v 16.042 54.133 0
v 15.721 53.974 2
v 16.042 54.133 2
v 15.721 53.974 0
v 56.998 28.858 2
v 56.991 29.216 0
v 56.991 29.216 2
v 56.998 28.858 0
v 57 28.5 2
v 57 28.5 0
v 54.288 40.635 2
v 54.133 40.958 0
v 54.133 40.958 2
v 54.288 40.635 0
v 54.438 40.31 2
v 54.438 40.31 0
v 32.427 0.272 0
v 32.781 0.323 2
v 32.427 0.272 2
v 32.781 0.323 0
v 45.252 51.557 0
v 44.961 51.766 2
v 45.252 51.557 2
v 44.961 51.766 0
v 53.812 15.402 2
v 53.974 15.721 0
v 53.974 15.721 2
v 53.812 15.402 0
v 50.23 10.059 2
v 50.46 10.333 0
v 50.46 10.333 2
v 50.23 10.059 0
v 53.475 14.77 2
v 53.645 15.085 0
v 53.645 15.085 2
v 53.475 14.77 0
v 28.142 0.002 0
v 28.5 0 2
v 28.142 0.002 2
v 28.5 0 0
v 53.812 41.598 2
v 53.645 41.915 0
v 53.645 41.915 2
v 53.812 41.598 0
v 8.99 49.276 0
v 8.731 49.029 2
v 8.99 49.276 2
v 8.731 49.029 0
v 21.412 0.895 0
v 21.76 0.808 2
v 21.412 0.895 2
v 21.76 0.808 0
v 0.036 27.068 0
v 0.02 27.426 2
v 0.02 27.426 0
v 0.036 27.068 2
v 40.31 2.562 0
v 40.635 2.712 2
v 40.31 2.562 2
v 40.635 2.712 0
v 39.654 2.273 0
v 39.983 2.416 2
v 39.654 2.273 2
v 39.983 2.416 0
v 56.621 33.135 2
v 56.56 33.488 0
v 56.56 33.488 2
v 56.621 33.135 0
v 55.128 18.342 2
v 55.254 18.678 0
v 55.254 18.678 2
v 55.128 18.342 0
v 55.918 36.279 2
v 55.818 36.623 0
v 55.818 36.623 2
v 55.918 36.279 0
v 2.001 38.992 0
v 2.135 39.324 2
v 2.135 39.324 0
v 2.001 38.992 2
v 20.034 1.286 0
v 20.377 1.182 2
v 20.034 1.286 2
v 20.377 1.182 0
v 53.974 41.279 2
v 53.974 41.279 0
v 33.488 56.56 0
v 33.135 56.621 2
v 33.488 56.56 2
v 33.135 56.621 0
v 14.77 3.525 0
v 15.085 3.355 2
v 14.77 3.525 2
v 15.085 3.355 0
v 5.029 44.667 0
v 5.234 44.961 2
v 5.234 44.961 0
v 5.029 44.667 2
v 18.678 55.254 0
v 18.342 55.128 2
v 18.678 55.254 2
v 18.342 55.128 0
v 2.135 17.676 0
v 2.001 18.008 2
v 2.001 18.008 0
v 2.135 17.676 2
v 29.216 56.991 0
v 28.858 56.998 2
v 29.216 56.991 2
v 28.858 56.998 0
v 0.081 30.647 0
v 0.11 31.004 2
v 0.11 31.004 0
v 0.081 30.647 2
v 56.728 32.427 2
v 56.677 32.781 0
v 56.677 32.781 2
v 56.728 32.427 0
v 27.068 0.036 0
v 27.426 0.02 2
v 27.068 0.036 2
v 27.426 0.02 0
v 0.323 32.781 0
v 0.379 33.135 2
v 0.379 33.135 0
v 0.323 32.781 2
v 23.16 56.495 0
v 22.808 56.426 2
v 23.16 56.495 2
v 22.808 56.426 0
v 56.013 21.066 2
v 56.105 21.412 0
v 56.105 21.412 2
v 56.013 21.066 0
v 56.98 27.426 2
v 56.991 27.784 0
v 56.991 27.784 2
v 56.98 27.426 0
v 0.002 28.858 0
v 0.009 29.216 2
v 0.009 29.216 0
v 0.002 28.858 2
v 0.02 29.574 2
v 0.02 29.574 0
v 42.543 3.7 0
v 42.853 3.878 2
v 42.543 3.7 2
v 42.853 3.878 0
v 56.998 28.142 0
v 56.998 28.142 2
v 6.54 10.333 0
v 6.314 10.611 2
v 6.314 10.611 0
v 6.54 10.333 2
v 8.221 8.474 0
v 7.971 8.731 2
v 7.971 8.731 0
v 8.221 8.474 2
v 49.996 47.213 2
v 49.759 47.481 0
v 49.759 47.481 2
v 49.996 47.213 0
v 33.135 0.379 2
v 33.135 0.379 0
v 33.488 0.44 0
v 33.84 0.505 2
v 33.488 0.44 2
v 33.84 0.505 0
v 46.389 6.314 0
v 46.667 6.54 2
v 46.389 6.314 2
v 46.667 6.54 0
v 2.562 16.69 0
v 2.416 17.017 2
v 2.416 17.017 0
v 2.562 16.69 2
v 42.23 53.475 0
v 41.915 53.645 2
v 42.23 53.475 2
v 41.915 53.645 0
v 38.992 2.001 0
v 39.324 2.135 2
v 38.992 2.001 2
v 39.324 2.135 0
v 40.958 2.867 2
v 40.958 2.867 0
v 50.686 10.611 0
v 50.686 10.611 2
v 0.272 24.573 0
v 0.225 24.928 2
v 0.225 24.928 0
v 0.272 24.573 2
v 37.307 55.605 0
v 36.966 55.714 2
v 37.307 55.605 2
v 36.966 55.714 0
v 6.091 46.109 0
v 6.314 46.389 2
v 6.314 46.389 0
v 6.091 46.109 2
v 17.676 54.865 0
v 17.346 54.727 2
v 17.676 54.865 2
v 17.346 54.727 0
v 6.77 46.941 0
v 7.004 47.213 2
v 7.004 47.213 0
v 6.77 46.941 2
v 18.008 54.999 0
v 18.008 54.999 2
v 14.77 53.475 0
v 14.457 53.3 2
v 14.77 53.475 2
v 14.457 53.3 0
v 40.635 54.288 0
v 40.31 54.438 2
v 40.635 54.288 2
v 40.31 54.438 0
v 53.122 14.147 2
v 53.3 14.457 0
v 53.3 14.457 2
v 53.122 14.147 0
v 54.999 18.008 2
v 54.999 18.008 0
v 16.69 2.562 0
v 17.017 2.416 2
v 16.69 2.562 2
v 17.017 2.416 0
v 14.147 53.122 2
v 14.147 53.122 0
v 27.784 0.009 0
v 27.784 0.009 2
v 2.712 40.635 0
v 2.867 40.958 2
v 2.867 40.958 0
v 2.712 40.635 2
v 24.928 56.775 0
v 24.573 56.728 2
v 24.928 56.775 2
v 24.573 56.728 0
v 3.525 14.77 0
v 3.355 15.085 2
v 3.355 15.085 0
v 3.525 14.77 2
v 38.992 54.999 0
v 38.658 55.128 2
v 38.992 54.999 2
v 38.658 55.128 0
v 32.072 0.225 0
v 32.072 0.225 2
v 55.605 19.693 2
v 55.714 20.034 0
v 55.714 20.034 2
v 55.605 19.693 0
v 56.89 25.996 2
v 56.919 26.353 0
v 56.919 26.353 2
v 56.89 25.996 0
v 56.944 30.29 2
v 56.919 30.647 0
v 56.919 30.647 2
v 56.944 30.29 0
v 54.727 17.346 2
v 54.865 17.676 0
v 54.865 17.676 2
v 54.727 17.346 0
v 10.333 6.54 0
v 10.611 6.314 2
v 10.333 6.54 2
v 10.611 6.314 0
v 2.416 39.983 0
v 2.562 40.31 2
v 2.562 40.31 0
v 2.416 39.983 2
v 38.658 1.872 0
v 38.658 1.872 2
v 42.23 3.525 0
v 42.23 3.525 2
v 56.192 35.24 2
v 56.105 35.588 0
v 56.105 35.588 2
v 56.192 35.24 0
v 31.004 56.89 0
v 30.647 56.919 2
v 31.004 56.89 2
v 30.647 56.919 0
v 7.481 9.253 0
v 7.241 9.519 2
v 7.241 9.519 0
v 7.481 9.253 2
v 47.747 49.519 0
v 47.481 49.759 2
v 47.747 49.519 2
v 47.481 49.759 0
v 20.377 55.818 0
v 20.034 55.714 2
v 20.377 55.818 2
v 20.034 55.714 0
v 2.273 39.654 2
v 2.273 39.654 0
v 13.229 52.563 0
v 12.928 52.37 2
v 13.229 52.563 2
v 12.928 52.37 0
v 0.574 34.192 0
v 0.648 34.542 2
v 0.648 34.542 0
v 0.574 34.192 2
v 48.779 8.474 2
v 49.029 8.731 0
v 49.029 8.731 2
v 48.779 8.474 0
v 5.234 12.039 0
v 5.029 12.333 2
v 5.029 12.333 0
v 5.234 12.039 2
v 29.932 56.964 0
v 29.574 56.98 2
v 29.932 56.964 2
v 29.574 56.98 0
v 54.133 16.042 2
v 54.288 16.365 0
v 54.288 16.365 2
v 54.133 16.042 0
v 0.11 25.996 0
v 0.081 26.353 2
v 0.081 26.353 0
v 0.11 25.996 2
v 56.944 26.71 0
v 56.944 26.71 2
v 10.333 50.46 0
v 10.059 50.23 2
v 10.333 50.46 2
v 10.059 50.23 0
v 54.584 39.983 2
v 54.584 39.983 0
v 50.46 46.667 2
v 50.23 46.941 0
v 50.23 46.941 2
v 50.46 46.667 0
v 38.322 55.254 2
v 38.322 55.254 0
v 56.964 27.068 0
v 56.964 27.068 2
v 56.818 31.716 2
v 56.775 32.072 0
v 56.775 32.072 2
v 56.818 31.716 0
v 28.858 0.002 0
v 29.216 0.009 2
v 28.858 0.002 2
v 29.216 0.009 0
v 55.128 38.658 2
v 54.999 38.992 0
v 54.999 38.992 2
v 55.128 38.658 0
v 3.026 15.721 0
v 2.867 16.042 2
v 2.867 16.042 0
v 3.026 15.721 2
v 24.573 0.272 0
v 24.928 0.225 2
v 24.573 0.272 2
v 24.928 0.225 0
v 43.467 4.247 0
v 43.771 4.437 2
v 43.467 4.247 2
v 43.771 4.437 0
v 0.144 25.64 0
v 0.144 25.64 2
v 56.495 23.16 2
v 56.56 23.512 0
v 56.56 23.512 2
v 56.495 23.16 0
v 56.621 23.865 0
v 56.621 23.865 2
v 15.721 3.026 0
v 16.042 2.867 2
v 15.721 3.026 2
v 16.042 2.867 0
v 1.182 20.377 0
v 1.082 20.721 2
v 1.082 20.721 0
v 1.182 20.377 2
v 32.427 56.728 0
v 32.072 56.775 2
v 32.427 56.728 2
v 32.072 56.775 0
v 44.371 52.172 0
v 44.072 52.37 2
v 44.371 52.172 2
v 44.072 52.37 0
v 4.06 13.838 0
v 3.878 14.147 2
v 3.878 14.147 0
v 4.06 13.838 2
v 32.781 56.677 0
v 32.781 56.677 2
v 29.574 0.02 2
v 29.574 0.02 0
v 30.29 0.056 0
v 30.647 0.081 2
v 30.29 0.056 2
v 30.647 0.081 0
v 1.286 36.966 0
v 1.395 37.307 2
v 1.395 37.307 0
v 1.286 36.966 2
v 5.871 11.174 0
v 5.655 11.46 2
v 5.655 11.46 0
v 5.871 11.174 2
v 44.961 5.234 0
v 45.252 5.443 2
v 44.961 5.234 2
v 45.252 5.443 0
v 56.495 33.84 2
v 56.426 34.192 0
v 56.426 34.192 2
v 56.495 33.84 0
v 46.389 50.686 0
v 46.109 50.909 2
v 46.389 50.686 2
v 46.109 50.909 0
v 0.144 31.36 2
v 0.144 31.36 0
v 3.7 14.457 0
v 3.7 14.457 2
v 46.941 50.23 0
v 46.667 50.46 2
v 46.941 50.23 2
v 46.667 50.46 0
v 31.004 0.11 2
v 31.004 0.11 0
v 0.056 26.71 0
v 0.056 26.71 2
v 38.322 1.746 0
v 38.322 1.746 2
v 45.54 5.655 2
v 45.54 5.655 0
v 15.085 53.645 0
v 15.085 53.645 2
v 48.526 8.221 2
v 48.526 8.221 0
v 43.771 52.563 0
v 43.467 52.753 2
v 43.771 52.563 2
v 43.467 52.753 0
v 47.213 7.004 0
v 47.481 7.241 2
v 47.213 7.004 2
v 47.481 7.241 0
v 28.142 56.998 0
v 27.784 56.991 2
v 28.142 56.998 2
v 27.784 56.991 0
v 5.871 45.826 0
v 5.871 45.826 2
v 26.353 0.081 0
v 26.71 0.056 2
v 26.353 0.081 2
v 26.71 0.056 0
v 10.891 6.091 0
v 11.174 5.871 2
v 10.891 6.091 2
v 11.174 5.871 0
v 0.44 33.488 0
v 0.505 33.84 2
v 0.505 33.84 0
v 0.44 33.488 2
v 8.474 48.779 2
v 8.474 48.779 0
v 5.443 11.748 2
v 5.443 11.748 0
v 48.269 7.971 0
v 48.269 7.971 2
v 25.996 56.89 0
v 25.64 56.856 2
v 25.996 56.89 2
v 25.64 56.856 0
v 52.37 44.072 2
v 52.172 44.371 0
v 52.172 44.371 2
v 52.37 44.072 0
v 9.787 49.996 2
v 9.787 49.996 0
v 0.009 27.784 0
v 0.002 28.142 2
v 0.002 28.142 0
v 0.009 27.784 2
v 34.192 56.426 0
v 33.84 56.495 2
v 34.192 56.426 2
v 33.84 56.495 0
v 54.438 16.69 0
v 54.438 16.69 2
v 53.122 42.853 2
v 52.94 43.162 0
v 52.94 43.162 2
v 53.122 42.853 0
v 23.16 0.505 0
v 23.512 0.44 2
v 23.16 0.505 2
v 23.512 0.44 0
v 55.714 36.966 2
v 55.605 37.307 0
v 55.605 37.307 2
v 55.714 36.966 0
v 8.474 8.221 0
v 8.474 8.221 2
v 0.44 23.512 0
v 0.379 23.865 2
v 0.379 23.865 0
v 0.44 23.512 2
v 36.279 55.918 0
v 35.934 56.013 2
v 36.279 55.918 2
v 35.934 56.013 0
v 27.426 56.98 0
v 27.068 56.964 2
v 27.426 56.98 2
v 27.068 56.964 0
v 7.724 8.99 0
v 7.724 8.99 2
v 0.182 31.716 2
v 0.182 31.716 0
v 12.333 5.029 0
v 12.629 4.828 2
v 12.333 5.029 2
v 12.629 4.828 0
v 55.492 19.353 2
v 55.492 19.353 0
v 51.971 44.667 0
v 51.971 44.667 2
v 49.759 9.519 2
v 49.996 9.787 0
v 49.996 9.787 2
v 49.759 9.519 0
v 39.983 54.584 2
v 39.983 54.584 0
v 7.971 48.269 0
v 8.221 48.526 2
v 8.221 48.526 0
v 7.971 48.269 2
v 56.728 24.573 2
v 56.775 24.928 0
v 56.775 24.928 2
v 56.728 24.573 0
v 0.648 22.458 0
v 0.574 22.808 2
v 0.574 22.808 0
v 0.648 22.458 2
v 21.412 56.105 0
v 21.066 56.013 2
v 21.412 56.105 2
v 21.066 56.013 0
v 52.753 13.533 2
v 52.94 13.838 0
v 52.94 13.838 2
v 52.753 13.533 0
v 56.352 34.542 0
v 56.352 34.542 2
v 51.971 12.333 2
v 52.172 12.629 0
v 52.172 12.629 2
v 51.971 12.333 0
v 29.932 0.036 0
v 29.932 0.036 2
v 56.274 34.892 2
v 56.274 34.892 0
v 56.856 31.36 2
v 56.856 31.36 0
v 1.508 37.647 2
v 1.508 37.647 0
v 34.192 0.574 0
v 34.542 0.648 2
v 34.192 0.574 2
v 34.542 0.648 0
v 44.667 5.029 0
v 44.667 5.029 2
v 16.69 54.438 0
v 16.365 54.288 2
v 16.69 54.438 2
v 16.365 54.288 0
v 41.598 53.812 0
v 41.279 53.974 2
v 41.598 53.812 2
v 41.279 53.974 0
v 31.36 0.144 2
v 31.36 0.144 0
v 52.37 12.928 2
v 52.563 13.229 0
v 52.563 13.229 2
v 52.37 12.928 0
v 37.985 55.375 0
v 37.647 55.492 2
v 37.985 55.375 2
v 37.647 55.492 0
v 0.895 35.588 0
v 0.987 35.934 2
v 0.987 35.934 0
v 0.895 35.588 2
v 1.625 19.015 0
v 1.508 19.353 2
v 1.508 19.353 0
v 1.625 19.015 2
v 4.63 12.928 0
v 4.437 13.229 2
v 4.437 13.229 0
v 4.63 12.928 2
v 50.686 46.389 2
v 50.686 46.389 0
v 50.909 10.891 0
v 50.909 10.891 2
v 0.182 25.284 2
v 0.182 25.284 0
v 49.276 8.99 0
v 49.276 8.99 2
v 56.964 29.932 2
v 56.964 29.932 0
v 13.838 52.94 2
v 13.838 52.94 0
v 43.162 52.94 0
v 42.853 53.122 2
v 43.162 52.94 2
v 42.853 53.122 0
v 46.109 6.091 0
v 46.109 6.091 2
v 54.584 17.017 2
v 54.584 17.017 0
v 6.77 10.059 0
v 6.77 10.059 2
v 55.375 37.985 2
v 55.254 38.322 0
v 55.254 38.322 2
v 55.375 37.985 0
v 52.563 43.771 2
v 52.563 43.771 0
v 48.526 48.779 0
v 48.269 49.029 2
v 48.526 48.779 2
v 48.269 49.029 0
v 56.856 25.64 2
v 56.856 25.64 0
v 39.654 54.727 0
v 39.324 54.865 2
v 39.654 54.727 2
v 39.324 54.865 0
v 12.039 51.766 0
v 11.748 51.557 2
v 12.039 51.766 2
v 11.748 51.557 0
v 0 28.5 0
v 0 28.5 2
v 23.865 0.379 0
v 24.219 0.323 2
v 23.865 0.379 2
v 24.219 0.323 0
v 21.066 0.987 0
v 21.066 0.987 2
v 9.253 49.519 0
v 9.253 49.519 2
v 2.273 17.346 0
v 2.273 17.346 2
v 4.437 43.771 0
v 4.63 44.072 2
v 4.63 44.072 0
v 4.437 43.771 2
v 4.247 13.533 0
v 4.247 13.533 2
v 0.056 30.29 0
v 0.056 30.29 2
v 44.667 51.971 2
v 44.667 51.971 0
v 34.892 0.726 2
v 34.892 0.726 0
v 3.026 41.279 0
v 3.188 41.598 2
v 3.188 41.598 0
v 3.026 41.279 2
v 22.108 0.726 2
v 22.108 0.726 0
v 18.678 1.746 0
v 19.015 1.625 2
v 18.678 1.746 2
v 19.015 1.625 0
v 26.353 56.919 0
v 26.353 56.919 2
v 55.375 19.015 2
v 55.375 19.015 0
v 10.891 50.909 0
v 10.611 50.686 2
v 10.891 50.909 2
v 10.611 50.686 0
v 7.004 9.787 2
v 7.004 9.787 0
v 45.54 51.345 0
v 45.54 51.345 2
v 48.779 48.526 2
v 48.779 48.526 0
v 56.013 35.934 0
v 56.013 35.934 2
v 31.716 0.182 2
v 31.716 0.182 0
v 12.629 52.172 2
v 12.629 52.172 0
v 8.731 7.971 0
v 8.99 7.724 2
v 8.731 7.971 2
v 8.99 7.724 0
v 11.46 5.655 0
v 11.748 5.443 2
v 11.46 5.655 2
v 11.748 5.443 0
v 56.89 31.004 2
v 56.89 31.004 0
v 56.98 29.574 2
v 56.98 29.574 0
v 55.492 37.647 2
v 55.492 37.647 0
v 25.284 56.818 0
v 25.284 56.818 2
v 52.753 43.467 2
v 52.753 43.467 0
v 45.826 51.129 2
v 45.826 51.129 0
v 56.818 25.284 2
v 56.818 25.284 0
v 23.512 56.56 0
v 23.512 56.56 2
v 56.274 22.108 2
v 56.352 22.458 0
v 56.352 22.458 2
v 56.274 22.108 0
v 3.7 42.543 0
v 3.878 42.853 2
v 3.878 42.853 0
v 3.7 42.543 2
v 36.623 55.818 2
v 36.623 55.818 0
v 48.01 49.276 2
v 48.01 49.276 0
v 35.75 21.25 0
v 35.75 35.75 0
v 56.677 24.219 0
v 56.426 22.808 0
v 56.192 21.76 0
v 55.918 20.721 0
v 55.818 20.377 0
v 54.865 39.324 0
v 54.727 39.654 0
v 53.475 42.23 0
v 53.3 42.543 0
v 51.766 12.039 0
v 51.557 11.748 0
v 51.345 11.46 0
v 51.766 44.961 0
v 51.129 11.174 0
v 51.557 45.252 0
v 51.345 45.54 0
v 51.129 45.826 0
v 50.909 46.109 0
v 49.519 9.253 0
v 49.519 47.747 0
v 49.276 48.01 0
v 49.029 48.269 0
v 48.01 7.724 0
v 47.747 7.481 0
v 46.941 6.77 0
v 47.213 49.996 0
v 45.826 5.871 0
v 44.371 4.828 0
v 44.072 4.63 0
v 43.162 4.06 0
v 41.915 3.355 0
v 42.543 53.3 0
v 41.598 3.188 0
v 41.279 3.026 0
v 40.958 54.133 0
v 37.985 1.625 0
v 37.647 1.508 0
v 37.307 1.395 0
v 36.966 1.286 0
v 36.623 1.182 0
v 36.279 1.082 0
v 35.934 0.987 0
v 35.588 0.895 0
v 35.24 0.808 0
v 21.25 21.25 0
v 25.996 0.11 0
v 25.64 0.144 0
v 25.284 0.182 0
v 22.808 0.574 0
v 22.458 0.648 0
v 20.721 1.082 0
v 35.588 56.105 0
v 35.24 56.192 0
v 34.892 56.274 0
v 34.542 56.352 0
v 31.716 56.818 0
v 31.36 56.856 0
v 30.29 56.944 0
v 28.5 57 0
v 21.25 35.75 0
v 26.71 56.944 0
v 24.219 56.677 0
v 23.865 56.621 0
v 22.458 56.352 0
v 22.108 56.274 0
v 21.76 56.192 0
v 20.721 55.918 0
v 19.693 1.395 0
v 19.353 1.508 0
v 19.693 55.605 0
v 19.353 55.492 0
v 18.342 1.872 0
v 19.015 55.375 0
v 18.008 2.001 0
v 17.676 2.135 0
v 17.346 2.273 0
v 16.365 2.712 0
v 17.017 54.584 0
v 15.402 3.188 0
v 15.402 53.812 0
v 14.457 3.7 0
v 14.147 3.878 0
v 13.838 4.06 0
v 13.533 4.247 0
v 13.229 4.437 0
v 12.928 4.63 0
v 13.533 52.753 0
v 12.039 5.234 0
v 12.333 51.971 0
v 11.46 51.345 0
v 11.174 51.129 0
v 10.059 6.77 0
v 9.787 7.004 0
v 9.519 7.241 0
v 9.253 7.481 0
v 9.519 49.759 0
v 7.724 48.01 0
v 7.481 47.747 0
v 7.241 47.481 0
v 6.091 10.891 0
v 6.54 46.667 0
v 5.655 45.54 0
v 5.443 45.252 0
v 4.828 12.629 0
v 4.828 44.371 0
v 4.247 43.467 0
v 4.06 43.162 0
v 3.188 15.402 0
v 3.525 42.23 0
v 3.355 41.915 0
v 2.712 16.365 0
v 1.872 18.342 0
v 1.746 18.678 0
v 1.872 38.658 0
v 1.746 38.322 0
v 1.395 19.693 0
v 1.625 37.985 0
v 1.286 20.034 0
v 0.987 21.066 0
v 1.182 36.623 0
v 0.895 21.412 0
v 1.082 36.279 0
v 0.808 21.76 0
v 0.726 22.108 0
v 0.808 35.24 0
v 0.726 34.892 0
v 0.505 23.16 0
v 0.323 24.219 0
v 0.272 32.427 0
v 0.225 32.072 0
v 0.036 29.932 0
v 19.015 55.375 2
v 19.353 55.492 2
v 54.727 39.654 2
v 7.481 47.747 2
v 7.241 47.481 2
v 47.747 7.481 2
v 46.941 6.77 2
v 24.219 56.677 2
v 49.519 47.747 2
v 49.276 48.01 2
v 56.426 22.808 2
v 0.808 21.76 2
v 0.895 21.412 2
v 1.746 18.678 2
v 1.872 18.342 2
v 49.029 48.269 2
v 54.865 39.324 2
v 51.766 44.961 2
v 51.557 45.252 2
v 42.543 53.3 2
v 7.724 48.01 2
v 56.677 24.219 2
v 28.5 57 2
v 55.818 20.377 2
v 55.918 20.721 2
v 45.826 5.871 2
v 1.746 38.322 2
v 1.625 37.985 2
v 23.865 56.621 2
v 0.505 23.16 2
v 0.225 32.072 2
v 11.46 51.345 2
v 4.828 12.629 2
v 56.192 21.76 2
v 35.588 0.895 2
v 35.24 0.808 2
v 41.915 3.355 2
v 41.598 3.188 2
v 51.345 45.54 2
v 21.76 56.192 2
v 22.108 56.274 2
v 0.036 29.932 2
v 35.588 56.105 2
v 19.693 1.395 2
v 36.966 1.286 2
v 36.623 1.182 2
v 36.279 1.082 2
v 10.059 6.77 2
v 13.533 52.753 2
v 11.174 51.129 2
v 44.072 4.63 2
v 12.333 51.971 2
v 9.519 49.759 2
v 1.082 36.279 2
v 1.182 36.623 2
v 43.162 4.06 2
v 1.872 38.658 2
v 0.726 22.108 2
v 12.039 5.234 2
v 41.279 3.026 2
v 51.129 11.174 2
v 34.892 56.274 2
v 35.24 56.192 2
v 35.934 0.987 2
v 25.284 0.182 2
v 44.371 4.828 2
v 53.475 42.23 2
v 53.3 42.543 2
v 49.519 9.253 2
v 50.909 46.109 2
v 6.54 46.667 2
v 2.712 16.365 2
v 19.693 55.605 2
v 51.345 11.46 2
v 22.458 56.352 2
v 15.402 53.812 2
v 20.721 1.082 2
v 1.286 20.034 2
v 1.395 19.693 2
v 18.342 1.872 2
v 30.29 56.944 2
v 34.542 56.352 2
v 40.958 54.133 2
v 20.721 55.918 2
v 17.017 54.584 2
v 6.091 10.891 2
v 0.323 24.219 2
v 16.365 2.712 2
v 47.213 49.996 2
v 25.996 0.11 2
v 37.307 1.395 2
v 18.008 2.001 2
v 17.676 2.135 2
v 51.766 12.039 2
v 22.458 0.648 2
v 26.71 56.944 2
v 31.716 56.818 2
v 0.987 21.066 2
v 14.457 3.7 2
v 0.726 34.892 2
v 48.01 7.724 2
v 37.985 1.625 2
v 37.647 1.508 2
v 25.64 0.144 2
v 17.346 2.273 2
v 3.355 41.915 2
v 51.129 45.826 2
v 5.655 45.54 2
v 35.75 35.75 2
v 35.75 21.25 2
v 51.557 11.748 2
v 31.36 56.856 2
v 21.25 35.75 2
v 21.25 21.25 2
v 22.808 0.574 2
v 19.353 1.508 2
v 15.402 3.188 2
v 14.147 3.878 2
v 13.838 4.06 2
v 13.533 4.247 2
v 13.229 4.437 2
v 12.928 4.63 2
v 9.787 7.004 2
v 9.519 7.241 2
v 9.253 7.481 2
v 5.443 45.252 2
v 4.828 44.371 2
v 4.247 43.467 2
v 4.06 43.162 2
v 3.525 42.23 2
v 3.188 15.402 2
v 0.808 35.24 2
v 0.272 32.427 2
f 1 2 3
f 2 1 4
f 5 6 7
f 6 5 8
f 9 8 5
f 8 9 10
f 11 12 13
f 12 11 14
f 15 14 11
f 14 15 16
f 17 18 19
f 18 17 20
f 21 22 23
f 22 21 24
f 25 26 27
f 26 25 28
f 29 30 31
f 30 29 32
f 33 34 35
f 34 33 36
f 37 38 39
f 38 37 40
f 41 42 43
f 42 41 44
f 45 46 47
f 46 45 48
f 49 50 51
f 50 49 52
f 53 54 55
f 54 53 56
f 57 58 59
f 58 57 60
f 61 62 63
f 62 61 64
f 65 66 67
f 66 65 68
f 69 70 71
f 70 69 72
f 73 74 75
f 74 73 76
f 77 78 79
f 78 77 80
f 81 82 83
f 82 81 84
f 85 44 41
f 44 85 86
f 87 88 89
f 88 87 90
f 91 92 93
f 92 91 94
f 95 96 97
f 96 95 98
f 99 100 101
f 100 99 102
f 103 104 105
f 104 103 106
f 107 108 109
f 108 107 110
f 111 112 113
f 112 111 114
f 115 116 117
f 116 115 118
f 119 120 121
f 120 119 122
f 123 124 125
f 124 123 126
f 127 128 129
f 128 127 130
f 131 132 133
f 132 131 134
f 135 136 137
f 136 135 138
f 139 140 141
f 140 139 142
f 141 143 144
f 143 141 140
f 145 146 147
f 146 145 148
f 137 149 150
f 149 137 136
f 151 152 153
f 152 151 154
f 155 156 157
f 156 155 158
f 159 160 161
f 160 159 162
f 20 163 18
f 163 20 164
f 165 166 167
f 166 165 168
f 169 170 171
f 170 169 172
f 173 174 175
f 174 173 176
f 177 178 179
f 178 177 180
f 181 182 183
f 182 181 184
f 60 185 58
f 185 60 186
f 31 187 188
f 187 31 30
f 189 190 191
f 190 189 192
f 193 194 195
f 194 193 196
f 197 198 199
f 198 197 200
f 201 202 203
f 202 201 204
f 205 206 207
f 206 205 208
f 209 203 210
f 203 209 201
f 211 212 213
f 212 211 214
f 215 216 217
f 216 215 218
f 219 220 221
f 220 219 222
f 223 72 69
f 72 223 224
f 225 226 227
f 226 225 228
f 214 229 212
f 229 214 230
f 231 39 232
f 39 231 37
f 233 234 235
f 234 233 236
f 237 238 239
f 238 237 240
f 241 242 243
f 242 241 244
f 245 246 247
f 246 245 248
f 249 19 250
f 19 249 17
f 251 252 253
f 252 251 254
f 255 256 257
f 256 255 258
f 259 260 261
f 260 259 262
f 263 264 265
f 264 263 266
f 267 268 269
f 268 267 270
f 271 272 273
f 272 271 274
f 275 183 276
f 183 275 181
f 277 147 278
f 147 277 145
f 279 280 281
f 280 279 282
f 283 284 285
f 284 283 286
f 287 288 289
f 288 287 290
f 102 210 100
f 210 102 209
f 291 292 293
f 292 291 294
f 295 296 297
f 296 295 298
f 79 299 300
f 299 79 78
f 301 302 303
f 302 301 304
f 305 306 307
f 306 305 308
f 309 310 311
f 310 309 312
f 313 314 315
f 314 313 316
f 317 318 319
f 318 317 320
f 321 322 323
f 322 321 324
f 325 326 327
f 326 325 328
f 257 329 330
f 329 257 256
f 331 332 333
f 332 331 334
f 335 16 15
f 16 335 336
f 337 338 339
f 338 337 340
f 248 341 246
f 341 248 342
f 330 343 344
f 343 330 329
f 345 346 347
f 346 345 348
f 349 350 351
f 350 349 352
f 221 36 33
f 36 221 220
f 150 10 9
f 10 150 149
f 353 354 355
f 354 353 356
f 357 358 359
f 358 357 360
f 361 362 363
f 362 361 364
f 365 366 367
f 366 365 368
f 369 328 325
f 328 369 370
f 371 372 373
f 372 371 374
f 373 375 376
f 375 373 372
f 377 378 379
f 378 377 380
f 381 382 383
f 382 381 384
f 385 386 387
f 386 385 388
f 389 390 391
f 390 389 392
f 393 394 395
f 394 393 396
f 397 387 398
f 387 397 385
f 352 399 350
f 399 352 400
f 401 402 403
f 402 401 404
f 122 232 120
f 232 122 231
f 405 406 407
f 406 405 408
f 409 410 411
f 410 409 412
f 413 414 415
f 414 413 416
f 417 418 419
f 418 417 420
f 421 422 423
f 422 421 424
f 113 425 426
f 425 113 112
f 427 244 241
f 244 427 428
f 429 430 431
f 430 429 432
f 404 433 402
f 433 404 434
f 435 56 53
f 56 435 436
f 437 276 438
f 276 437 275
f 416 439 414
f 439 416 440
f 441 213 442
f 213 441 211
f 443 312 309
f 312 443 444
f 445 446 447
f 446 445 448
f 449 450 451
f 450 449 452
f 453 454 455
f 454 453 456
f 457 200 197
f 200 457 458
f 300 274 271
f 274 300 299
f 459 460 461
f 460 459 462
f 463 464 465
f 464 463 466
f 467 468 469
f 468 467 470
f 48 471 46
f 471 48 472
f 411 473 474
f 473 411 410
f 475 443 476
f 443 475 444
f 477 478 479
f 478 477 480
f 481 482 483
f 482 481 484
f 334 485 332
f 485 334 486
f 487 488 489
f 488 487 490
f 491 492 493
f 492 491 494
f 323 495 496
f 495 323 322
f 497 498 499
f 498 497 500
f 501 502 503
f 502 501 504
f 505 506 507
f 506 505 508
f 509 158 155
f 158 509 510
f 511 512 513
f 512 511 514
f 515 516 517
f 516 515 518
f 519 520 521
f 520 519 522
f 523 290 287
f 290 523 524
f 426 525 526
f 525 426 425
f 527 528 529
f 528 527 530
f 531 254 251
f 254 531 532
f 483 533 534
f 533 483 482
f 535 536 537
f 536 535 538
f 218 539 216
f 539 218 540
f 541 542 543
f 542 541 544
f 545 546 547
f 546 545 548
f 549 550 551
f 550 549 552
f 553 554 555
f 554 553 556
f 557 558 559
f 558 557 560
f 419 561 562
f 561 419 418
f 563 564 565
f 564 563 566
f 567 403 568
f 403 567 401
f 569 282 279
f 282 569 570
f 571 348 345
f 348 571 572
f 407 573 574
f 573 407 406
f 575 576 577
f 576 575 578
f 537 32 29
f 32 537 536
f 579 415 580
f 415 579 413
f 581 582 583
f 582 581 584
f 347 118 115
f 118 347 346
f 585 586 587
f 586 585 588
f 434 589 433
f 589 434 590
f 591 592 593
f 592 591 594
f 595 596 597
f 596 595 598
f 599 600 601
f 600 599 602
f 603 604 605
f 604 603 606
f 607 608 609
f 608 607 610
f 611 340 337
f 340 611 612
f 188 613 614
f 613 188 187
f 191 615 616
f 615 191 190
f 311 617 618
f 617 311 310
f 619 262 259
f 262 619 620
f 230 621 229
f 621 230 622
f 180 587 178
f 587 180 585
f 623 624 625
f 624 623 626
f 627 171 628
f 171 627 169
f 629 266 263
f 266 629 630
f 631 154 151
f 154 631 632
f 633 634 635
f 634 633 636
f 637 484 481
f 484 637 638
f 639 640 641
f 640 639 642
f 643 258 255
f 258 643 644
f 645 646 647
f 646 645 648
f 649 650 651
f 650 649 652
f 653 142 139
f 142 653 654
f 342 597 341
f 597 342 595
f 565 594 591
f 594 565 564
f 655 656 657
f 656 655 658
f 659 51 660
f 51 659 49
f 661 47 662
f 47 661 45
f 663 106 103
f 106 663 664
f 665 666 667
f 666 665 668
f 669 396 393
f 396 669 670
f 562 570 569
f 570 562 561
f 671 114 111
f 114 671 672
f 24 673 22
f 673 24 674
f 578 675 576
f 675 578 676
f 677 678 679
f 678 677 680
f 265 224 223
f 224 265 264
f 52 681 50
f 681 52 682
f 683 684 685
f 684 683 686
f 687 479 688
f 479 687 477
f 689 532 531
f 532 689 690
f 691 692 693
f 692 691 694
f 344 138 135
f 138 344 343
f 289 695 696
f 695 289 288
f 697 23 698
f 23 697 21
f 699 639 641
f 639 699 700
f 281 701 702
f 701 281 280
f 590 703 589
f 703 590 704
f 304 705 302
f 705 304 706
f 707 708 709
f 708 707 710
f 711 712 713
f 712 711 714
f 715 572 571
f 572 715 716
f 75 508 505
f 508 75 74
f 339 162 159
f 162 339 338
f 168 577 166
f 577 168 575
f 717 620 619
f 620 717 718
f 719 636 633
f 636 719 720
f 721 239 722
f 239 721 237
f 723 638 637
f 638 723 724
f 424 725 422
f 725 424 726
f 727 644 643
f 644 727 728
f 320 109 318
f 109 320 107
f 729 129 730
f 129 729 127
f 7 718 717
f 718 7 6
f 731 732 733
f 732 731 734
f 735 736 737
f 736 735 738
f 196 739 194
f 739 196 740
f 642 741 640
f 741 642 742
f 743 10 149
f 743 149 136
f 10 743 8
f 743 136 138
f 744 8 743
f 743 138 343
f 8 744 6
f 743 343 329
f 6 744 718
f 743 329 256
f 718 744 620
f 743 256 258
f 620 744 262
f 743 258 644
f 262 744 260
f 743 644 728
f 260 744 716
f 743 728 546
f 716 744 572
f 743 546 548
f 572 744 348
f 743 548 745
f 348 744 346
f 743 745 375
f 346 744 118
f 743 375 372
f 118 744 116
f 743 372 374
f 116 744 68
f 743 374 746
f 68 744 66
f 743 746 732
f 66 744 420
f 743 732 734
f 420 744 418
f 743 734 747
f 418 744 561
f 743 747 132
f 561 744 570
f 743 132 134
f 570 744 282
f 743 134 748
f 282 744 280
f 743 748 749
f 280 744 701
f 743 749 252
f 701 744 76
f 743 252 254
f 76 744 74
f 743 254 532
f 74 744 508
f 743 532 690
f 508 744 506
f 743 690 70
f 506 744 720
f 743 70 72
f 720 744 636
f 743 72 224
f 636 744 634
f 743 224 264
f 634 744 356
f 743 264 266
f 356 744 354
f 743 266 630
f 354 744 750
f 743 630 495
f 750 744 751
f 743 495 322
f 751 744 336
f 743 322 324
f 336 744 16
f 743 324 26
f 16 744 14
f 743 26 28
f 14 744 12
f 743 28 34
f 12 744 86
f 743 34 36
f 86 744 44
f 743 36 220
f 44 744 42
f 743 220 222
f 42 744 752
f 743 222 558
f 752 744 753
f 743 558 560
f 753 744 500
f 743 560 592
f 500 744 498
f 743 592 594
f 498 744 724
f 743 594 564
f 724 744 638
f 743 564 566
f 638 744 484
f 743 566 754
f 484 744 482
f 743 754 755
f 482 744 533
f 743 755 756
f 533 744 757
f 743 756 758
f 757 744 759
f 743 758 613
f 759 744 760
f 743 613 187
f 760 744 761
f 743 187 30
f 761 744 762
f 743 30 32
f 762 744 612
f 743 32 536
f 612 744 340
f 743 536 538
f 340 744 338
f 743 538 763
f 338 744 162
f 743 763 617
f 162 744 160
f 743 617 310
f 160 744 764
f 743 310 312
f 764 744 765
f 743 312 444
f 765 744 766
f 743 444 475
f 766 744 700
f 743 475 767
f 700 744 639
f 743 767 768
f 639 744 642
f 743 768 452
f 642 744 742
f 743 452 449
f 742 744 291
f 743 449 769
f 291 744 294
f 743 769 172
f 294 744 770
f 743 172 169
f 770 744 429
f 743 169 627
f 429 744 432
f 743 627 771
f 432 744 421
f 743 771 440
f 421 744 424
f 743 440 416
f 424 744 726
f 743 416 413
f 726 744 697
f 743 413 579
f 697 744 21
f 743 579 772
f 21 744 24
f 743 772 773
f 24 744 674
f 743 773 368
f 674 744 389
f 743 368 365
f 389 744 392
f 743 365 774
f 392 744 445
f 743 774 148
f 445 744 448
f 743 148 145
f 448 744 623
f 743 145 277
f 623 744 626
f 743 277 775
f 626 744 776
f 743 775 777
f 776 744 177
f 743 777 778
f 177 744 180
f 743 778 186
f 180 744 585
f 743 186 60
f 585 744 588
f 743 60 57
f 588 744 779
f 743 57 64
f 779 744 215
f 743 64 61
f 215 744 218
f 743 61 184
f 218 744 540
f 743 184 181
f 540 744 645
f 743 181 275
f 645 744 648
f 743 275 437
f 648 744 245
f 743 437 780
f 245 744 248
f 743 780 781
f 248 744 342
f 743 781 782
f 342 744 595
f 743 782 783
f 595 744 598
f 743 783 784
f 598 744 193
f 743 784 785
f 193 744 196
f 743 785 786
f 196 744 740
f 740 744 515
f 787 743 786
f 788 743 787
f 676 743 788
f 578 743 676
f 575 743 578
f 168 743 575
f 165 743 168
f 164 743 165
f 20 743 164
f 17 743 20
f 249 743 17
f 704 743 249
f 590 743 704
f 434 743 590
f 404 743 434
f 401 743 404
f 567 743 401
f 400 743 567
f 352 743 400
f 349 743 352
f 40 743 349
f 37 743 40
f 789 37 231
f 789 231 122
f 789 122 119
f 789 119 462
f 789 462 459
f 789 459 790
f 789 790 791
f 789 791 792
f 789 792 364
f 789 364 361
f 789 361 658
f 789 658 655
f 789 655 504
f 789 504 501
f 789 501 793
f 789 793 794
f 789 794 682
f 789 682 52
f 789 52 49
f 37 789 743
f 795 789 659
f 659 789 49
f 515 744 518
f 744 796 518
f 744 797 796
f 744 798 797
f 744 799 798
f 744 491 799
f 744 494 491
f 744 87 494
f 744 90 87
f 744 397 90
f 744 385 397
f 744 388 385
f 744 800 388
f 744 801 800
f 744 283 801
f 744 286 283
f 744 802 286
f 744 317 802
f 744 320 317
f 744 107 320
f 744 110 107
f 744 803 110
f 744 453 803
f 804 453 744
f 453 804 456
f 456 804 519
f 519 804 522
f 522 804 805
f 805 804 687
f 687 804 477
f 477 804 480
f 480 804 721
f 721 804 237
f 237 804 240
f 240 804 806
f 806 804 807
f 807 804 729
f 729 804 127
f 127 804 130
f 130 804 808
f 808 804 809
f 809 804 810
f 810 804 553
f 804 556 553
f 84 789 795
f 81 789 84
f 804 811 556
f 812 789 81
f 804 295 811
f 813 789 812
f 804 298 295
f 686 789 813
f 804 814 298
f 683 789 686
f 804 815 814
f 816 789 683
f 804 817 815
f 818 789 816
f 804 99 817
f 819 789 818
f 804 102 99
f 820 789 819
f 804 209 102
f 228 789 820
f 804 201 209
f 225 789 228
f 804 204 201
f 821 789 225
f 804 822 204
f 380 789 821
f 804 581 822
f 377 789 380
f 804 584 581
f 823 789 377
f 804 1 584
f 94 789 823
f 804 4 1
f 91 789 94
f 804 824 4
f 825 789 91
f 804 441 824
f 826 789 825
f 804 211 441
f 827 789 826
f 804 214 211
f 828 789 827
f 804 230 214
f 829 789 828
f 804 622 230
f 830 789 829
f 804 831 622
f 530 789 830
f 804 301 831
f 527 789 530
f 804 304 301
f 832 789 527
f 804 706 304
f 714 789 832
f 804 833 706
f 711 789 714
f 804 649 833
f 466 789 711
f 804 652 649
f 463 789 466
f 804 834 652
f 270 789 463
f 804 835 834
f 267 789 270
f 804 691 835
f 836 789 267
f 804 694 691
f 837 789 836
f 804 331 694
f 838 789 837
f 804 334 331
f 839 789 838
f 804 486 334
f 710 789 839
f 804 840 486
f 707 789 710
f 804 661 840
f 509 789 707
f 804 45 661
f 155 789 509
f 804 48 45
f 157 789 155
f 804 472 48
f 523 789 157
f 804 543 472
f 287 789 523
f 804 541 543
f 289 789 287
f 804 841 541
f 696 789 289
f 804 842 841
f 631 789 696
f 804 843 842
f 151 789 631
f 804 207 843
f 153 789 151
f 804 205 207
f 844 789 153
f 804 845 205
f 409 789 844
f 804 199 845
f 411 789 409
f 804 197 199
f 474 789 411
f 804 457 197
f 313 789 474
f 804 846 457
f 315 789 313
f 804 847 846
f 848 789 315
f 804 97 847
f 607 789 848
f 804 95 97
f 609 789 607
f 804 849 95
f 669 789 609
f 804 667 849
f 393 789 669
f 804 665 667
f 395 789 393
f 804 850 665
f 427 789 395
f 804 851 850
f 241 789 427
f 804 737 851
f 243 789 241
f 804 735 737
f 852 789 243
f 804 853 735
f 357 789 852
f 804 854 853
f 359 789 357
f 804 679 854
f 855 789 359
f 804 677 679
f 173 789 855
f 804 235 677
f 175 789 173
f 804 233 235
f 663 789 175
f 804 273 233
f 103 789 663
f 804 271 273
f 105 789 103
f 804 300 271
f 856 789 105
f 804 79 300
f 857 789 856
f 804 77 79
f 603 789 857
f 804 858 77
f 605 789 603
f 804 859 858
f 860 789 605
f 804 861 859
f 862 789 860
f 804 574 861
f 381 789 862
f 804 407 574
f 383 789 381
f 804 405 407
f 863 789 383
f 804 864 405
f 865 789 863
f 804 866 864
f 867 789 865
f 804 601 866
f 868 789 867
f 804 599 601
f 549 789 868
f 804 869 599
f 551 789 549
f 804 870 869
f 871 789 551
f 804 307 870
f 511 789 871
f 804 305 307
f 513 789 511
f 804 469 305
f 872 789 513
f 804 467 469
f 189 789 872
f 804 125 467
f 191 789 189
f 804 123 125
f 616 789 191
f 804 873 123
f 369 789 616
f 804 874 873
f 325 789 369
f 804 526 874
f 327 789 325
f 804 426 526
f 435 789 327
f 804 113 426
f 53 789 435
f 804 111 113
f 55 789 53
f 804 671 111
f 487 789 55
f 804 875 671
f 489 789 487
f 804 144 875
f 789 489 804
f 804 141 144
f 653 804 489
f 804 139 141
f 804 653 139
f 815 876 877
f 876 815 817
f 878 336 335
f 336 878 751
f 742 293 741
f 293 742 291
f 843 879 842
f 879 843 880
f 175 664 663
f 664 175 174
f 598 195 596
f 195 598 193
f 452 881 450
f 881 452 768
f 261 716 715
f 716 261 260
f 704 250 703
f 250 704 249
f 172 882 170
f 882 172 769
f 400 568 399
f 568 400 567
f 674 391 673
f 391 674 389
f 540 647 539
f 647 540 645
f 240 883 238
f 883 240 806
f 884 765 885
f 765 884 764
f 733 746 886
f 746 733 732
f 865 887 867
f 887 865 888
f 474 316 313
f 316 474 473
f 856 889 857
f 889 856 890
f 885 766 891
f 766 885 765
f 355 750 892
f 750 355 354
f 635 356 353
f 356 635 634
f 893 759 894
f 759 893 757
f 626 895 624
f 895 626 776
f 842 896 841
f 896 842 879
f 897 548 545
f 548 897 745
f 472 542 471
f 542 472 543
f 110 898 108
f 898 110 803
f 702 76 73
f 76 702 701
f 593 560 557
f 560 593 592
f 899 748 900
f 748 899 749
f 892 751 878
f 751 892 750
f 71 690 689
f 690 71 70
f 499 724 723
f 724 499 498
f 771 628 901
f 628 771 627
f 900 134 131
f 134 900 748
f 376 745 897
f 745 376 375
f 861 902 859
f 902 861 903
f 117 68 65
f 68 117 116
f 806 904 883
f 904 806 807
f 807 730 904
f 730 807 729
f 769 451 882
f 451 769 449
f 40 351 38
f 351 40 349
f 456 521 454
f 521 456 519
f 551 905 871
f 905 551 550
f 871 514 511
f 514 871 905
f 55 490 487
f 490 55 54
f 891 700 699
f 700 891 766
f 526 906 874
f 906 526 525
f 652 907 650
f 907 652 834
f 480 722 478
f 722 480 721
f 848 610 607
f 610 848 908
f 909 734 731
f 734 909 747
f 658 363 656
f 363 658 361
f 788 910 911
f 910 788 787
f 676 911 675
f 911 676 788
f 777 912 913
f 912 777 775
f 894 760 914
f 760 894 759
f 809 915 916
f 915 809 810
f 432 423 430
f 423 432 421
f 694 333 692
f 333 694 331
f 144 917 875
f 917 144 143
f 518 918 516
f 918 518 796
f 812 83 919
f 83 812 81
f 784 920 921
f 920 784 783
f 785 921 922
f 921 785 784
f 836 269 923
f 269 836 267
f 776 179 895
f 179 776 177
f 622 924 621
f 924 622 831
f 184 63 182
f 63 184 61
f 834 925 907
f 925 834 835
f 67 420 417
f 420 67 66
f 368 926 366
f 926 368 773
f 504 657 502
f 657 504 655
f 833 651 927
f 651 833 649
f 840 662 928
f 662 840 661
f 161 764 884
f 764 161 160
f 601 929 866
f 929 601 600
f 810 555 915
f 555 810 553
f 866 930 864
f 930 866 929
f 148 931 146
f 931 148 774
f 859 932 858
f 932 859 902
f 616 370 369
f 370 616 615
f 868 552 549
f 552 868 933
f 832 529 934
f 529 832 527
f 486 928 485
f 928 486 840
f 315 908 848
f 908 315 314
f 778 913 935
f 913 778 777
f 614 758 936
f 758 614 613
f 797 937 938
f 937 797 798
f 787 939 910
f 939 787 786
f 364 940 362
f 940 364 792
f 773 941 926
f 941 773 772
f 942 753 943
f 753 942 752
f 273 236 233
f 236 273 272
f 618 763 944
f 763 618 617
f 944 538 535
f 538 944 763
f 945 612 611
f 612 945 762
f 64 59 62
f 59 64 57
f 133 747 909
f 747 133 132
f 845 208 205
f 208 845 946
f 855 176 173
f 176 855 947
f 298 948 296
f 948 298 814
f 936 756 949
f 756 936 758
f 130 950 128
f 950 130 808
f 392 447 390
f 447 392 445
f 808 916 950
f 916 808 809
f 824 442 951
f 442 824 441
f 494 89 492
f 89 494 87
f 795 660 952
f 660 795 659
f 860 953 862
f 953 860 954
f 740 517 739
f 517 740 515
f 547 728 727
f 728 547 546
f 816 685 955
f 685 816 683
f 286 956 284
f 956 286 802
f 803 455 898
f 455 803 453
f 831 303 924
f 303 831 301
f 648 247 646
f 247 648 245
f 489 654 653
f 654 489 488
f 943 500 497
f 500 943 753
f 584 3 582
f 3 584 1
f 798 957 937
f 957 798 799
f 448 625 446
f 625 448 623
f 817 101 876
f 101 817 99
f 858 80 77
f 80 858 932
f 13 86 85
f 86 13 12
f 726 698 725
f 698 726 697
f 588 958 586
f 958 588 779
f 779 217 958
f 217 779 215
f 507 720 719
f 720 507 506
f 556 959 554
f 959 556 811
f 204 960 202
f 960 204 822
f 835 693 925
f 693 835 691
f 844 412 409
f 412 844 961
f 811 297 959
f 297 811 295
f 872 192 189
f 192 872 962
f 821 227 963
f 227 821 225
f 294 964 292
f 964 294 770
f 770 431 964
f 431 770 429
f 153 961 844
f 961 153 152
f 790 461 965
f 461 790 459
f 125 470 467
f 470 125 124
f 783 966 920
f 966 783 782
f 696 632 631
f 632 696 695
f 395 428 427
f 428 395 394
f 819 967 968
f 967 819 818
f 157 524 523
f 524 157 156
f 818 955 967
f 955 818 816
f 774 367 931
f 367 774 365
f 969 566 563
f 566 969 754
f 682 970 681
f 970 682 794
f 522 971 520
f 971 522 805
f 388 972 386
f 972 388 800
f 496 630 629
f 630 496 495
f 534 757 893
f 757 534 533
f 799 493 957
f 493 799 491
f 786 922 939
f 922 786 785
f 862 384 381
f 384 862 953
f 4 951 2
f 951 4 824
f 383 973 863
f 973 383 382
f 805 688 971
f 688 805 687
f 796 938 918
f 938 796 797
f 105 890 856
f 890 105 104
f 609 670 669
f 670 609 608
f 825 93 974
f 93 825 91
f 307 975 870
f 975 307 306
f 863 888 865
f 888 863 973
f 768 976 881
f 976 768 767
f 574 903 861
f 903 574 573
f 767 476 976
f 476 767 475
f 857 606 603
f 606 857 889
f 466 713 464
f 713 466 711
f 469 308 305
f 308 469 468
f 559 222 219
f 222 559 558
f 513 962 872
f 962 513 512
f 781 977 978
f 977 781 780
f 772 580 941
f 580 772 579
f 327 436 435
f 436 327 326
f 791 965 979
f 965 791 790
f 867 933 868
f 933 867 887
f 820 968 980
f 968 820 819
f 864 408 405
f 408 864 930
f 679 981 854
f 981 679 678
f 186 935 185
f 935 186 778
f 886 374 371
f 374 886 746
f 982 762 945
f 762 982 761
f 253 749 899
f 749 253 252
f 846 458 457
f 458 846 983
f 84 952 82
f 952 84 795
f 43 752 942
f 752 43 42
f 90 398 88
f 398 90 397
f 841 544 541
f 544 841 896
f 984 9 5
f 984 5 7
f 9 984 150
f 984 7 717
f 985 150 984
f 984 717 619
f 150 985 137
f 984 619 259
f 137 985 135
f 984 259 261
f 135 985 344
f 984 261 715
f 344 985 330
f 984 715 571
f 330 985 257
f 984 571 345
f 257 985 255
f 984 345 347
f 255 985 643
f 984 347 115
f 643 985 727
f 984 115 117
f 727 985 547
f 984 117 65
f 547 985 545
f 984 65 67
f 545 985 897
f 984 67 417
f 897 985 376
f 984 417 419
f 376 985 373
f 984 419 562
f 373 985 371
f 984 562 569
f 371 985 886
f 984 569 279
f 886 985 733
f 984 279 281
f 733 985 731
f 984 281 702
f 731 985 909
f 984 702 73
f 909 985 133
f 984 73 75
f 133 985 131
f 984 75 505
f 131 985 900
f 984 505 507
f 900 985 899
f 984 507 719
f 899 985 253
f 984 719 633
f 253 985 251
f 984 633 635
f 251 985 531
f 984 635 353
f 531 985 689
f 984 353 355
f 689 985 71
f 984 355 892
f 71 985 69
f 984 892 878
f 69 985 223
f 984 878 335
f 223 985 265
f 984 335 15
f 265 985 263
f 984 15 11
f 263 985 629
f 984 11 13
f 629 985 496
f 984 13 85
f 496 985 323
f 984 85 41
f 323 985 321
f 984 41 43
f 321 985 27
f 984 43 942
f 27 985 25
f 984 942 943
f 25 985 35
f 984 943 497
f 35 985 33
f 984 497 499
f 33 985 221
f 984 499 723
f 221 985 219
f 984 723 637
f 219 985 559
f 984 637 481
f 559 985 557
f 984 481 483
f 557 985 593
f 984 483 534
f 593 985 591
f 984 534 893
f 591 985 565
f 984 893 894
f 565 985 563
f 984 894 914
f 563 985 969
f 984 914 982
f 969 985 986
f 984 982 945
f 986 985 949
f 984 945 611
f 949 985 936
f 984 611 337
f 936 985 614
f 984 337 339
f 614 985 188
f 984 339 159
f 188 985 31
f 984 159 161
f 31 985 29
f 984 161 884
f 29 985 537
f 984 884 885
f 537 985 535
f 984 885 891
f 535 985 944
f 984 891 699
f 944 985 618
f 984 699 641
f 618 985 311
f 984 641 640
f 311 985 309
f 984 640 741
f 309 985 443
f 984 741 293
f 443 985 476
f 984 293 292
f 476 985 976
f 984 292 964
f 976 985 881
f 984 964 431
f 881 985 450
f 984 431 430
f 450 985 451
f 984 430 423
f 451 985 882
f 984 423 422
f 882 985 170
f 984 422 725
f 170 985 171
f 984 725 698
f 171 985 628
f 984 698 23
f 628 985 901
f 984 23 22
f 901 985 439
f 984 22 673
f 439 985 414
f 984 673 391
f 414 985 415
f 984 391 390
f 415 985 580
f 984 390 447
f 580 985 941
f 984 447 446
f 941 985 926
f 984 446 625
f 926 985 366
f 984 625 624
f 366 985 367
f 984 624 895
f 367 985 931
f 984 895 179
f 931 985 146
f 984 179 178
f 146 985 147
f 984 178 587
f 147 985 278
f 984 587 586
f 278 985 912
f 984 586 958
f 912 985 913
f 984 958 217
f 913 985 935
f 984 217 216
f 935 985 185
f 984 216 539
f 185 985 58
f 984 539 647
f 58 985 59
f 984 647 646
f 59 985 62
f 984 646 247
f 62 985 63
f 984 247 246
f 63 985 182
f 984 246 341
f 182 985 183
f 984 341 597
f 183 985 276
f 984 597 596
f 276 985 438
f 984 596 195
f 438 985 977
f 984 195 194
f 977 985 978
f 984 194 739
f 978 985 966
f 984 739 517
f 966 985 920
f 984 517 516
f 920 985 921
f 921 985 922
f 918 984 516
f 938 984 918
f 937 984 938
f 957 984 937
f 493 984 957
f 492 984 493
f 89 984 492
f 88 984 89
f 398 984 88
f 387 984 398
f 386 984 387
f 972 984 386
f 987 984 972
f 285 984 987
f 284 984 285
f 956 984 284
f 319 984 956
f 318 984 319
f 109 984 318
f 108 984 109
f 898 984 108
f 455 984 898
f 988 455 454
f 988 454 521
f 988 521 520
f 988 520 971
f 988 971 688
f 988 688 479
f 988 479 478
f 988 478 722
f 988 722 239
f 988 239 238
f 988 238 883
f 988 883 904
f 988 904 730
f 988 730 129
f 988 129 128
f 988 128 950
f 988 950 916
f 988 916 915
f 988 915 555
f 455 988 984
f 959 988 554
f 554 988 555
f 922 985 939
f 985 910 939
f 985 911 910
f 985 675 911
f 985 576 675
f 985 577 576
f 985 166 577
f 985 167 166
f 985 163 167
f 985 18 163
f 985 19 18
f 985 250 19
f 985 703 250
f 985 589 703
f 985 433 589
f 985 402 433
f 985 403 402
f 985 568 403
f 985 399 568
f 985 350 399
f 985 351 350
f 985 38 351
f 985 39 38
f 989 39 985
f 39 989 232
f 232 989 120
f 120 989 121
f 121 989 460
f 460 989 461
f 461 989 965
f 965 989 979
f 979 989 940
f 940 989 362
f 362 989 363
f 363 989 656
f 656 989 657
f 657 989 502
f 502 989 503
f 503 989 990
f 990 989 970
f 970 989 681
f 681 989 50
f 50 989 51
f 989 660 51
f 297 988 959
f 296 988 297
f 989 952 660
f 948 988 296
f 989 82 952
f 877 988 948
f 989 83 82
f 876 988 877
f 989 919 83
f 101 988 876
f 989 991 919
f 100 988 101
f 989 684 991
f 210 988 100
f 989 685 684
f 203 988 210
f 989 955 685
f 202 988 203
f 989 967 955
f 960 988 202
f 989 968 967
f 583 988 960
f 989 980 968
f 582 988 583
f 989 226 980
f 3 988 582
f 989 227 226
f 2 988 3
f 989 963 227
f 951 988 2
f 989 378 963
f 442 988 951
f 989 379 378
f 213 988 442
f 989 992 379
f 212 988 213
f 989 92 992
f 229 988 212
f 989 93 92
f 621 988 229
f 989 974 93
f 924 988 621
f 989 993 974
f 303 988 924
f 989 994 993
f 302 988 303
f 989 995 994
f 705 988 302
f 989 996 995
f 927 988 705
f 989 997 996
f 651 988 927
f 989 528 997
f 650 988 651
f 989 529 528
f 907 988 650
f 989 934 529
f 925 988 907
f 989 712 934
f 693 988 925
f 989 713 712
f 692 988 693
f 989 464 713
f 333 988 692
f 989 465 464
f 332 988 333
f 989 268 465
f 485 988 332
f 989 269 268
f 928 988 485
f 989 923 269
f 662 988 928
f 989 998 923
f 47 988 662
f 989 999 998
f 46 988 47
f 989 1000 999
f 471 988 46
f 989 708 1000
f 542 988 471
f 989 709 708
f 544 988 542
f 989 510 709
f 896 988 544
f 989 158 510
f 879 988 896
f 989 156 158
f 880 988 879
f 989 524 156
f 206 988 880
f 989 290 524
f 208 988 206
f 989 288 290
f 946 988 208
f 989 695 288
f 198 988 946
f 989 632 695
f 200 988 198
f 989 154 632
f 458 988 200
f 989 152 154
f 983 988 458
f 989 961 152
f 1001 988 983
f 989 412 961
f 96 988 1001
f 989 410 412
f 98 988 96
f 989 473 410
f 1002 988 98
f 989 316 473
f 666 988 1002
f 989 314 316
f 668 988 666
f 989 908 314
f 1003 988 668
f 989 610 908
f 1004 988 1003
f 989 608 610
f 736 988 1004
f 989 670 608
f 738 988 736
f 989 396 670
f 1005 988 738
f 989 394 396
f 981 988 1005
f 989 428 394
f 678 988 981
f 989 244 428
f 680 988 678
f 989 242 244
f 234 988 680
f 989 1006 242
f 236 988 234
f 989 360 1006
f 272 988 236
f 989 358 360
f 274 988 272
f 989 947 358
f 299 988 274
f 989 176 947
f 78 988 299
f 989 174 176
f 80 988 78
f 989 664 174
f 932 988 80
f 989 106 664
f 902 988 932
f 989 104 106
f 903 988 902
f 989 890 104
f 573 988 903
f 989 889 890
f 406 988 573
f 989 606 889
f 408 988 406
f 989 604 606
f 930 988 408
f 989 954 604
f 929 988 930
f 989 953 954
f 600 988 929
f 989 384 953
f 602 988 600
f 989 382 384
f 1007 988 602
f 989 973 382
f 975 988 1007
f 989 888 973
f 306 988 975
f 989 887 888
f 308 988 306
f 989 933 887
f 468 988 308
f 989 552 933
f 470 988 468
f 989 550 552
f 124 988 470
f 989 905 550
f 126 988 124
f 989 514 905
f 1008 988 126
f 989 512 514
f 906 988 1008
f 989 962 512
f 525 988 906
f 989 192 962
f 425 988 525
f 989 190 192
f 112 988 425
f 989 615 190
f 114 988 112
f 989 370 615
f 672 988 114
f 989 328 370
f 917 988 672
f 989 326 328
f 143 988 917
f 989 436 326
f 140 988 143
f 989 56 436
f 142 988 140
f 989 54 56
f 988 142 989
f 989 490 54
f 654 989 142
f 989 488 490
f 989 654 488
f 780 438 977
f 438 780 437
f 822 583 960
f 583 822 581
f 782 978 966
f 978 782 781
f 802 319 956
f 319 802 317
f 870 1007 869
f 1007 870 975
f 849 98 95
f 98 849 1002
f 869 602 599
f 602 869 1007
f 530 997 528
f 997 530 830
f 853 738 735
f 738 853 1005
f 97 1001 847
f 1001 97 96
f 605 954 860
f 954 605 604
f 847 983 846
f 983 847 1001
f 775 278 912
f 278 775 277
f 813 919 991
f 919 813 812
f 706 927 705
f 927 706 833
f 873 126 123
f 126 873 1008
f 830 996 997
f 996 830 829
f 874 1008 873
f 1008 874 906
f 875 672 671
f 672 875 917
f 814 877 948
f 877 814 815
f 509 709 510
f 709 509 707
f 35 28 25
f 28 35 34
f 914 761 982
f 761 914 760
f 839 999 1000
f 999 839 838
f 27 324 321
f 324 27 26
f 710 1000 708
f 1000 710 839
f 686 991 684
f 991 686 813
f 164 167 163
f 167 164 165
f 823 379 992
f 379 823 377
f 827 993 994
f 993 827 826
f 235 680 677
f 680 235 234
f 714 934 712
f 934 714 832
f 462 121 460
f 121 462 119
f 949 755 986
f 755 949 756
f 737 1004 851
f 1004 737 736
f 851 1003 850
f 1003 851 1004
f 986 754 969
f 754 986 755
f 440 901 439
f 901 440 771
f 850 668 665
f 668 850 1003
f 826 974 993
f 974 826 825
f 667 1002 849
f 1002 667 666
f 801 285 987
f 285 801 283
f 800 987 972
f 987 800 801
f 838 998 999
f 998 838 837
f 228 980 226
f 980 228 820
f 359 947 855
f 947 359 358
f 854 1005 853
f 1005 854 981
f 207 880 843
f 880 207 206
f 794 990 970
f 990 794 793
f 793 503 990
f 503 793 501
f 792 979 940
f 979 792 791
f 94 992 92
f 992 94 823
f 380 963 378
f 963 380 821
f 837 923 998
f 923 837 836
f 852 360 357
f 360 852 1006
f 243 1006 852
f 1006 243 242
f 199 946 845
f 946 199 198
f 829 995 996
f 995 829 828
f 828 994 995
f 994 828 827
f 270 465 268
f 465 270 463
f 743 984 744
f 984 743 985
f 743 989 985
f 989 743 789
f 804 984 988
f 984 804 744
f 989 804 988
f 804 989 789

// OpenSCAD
$fn=500;
width=17;
outerWidth=57;
wallWidth=2;
tabWidth=2;
hd=0.5; // holder distance

module centerCube()
{
	hull()
	{
		translate([2.25,2.25,18]) cube([10,10,1]);
		cube([14.5,14.5,5]);
	}
	
}


module mainCube()
{
	diff = outerWidth - width;
	offset = diff/2;
	innerWidth = width - (wallWidth*2);
	
	difference()
	{
		union()
		{
			translate([outerWidth/2,outerWidth/2,0]) cylinder(d=outerWidth,2);
		}
		
		
		translate([offset+1.25,offset+1.25,0]) centerCube();
		
	}
	
}

mainCube();
